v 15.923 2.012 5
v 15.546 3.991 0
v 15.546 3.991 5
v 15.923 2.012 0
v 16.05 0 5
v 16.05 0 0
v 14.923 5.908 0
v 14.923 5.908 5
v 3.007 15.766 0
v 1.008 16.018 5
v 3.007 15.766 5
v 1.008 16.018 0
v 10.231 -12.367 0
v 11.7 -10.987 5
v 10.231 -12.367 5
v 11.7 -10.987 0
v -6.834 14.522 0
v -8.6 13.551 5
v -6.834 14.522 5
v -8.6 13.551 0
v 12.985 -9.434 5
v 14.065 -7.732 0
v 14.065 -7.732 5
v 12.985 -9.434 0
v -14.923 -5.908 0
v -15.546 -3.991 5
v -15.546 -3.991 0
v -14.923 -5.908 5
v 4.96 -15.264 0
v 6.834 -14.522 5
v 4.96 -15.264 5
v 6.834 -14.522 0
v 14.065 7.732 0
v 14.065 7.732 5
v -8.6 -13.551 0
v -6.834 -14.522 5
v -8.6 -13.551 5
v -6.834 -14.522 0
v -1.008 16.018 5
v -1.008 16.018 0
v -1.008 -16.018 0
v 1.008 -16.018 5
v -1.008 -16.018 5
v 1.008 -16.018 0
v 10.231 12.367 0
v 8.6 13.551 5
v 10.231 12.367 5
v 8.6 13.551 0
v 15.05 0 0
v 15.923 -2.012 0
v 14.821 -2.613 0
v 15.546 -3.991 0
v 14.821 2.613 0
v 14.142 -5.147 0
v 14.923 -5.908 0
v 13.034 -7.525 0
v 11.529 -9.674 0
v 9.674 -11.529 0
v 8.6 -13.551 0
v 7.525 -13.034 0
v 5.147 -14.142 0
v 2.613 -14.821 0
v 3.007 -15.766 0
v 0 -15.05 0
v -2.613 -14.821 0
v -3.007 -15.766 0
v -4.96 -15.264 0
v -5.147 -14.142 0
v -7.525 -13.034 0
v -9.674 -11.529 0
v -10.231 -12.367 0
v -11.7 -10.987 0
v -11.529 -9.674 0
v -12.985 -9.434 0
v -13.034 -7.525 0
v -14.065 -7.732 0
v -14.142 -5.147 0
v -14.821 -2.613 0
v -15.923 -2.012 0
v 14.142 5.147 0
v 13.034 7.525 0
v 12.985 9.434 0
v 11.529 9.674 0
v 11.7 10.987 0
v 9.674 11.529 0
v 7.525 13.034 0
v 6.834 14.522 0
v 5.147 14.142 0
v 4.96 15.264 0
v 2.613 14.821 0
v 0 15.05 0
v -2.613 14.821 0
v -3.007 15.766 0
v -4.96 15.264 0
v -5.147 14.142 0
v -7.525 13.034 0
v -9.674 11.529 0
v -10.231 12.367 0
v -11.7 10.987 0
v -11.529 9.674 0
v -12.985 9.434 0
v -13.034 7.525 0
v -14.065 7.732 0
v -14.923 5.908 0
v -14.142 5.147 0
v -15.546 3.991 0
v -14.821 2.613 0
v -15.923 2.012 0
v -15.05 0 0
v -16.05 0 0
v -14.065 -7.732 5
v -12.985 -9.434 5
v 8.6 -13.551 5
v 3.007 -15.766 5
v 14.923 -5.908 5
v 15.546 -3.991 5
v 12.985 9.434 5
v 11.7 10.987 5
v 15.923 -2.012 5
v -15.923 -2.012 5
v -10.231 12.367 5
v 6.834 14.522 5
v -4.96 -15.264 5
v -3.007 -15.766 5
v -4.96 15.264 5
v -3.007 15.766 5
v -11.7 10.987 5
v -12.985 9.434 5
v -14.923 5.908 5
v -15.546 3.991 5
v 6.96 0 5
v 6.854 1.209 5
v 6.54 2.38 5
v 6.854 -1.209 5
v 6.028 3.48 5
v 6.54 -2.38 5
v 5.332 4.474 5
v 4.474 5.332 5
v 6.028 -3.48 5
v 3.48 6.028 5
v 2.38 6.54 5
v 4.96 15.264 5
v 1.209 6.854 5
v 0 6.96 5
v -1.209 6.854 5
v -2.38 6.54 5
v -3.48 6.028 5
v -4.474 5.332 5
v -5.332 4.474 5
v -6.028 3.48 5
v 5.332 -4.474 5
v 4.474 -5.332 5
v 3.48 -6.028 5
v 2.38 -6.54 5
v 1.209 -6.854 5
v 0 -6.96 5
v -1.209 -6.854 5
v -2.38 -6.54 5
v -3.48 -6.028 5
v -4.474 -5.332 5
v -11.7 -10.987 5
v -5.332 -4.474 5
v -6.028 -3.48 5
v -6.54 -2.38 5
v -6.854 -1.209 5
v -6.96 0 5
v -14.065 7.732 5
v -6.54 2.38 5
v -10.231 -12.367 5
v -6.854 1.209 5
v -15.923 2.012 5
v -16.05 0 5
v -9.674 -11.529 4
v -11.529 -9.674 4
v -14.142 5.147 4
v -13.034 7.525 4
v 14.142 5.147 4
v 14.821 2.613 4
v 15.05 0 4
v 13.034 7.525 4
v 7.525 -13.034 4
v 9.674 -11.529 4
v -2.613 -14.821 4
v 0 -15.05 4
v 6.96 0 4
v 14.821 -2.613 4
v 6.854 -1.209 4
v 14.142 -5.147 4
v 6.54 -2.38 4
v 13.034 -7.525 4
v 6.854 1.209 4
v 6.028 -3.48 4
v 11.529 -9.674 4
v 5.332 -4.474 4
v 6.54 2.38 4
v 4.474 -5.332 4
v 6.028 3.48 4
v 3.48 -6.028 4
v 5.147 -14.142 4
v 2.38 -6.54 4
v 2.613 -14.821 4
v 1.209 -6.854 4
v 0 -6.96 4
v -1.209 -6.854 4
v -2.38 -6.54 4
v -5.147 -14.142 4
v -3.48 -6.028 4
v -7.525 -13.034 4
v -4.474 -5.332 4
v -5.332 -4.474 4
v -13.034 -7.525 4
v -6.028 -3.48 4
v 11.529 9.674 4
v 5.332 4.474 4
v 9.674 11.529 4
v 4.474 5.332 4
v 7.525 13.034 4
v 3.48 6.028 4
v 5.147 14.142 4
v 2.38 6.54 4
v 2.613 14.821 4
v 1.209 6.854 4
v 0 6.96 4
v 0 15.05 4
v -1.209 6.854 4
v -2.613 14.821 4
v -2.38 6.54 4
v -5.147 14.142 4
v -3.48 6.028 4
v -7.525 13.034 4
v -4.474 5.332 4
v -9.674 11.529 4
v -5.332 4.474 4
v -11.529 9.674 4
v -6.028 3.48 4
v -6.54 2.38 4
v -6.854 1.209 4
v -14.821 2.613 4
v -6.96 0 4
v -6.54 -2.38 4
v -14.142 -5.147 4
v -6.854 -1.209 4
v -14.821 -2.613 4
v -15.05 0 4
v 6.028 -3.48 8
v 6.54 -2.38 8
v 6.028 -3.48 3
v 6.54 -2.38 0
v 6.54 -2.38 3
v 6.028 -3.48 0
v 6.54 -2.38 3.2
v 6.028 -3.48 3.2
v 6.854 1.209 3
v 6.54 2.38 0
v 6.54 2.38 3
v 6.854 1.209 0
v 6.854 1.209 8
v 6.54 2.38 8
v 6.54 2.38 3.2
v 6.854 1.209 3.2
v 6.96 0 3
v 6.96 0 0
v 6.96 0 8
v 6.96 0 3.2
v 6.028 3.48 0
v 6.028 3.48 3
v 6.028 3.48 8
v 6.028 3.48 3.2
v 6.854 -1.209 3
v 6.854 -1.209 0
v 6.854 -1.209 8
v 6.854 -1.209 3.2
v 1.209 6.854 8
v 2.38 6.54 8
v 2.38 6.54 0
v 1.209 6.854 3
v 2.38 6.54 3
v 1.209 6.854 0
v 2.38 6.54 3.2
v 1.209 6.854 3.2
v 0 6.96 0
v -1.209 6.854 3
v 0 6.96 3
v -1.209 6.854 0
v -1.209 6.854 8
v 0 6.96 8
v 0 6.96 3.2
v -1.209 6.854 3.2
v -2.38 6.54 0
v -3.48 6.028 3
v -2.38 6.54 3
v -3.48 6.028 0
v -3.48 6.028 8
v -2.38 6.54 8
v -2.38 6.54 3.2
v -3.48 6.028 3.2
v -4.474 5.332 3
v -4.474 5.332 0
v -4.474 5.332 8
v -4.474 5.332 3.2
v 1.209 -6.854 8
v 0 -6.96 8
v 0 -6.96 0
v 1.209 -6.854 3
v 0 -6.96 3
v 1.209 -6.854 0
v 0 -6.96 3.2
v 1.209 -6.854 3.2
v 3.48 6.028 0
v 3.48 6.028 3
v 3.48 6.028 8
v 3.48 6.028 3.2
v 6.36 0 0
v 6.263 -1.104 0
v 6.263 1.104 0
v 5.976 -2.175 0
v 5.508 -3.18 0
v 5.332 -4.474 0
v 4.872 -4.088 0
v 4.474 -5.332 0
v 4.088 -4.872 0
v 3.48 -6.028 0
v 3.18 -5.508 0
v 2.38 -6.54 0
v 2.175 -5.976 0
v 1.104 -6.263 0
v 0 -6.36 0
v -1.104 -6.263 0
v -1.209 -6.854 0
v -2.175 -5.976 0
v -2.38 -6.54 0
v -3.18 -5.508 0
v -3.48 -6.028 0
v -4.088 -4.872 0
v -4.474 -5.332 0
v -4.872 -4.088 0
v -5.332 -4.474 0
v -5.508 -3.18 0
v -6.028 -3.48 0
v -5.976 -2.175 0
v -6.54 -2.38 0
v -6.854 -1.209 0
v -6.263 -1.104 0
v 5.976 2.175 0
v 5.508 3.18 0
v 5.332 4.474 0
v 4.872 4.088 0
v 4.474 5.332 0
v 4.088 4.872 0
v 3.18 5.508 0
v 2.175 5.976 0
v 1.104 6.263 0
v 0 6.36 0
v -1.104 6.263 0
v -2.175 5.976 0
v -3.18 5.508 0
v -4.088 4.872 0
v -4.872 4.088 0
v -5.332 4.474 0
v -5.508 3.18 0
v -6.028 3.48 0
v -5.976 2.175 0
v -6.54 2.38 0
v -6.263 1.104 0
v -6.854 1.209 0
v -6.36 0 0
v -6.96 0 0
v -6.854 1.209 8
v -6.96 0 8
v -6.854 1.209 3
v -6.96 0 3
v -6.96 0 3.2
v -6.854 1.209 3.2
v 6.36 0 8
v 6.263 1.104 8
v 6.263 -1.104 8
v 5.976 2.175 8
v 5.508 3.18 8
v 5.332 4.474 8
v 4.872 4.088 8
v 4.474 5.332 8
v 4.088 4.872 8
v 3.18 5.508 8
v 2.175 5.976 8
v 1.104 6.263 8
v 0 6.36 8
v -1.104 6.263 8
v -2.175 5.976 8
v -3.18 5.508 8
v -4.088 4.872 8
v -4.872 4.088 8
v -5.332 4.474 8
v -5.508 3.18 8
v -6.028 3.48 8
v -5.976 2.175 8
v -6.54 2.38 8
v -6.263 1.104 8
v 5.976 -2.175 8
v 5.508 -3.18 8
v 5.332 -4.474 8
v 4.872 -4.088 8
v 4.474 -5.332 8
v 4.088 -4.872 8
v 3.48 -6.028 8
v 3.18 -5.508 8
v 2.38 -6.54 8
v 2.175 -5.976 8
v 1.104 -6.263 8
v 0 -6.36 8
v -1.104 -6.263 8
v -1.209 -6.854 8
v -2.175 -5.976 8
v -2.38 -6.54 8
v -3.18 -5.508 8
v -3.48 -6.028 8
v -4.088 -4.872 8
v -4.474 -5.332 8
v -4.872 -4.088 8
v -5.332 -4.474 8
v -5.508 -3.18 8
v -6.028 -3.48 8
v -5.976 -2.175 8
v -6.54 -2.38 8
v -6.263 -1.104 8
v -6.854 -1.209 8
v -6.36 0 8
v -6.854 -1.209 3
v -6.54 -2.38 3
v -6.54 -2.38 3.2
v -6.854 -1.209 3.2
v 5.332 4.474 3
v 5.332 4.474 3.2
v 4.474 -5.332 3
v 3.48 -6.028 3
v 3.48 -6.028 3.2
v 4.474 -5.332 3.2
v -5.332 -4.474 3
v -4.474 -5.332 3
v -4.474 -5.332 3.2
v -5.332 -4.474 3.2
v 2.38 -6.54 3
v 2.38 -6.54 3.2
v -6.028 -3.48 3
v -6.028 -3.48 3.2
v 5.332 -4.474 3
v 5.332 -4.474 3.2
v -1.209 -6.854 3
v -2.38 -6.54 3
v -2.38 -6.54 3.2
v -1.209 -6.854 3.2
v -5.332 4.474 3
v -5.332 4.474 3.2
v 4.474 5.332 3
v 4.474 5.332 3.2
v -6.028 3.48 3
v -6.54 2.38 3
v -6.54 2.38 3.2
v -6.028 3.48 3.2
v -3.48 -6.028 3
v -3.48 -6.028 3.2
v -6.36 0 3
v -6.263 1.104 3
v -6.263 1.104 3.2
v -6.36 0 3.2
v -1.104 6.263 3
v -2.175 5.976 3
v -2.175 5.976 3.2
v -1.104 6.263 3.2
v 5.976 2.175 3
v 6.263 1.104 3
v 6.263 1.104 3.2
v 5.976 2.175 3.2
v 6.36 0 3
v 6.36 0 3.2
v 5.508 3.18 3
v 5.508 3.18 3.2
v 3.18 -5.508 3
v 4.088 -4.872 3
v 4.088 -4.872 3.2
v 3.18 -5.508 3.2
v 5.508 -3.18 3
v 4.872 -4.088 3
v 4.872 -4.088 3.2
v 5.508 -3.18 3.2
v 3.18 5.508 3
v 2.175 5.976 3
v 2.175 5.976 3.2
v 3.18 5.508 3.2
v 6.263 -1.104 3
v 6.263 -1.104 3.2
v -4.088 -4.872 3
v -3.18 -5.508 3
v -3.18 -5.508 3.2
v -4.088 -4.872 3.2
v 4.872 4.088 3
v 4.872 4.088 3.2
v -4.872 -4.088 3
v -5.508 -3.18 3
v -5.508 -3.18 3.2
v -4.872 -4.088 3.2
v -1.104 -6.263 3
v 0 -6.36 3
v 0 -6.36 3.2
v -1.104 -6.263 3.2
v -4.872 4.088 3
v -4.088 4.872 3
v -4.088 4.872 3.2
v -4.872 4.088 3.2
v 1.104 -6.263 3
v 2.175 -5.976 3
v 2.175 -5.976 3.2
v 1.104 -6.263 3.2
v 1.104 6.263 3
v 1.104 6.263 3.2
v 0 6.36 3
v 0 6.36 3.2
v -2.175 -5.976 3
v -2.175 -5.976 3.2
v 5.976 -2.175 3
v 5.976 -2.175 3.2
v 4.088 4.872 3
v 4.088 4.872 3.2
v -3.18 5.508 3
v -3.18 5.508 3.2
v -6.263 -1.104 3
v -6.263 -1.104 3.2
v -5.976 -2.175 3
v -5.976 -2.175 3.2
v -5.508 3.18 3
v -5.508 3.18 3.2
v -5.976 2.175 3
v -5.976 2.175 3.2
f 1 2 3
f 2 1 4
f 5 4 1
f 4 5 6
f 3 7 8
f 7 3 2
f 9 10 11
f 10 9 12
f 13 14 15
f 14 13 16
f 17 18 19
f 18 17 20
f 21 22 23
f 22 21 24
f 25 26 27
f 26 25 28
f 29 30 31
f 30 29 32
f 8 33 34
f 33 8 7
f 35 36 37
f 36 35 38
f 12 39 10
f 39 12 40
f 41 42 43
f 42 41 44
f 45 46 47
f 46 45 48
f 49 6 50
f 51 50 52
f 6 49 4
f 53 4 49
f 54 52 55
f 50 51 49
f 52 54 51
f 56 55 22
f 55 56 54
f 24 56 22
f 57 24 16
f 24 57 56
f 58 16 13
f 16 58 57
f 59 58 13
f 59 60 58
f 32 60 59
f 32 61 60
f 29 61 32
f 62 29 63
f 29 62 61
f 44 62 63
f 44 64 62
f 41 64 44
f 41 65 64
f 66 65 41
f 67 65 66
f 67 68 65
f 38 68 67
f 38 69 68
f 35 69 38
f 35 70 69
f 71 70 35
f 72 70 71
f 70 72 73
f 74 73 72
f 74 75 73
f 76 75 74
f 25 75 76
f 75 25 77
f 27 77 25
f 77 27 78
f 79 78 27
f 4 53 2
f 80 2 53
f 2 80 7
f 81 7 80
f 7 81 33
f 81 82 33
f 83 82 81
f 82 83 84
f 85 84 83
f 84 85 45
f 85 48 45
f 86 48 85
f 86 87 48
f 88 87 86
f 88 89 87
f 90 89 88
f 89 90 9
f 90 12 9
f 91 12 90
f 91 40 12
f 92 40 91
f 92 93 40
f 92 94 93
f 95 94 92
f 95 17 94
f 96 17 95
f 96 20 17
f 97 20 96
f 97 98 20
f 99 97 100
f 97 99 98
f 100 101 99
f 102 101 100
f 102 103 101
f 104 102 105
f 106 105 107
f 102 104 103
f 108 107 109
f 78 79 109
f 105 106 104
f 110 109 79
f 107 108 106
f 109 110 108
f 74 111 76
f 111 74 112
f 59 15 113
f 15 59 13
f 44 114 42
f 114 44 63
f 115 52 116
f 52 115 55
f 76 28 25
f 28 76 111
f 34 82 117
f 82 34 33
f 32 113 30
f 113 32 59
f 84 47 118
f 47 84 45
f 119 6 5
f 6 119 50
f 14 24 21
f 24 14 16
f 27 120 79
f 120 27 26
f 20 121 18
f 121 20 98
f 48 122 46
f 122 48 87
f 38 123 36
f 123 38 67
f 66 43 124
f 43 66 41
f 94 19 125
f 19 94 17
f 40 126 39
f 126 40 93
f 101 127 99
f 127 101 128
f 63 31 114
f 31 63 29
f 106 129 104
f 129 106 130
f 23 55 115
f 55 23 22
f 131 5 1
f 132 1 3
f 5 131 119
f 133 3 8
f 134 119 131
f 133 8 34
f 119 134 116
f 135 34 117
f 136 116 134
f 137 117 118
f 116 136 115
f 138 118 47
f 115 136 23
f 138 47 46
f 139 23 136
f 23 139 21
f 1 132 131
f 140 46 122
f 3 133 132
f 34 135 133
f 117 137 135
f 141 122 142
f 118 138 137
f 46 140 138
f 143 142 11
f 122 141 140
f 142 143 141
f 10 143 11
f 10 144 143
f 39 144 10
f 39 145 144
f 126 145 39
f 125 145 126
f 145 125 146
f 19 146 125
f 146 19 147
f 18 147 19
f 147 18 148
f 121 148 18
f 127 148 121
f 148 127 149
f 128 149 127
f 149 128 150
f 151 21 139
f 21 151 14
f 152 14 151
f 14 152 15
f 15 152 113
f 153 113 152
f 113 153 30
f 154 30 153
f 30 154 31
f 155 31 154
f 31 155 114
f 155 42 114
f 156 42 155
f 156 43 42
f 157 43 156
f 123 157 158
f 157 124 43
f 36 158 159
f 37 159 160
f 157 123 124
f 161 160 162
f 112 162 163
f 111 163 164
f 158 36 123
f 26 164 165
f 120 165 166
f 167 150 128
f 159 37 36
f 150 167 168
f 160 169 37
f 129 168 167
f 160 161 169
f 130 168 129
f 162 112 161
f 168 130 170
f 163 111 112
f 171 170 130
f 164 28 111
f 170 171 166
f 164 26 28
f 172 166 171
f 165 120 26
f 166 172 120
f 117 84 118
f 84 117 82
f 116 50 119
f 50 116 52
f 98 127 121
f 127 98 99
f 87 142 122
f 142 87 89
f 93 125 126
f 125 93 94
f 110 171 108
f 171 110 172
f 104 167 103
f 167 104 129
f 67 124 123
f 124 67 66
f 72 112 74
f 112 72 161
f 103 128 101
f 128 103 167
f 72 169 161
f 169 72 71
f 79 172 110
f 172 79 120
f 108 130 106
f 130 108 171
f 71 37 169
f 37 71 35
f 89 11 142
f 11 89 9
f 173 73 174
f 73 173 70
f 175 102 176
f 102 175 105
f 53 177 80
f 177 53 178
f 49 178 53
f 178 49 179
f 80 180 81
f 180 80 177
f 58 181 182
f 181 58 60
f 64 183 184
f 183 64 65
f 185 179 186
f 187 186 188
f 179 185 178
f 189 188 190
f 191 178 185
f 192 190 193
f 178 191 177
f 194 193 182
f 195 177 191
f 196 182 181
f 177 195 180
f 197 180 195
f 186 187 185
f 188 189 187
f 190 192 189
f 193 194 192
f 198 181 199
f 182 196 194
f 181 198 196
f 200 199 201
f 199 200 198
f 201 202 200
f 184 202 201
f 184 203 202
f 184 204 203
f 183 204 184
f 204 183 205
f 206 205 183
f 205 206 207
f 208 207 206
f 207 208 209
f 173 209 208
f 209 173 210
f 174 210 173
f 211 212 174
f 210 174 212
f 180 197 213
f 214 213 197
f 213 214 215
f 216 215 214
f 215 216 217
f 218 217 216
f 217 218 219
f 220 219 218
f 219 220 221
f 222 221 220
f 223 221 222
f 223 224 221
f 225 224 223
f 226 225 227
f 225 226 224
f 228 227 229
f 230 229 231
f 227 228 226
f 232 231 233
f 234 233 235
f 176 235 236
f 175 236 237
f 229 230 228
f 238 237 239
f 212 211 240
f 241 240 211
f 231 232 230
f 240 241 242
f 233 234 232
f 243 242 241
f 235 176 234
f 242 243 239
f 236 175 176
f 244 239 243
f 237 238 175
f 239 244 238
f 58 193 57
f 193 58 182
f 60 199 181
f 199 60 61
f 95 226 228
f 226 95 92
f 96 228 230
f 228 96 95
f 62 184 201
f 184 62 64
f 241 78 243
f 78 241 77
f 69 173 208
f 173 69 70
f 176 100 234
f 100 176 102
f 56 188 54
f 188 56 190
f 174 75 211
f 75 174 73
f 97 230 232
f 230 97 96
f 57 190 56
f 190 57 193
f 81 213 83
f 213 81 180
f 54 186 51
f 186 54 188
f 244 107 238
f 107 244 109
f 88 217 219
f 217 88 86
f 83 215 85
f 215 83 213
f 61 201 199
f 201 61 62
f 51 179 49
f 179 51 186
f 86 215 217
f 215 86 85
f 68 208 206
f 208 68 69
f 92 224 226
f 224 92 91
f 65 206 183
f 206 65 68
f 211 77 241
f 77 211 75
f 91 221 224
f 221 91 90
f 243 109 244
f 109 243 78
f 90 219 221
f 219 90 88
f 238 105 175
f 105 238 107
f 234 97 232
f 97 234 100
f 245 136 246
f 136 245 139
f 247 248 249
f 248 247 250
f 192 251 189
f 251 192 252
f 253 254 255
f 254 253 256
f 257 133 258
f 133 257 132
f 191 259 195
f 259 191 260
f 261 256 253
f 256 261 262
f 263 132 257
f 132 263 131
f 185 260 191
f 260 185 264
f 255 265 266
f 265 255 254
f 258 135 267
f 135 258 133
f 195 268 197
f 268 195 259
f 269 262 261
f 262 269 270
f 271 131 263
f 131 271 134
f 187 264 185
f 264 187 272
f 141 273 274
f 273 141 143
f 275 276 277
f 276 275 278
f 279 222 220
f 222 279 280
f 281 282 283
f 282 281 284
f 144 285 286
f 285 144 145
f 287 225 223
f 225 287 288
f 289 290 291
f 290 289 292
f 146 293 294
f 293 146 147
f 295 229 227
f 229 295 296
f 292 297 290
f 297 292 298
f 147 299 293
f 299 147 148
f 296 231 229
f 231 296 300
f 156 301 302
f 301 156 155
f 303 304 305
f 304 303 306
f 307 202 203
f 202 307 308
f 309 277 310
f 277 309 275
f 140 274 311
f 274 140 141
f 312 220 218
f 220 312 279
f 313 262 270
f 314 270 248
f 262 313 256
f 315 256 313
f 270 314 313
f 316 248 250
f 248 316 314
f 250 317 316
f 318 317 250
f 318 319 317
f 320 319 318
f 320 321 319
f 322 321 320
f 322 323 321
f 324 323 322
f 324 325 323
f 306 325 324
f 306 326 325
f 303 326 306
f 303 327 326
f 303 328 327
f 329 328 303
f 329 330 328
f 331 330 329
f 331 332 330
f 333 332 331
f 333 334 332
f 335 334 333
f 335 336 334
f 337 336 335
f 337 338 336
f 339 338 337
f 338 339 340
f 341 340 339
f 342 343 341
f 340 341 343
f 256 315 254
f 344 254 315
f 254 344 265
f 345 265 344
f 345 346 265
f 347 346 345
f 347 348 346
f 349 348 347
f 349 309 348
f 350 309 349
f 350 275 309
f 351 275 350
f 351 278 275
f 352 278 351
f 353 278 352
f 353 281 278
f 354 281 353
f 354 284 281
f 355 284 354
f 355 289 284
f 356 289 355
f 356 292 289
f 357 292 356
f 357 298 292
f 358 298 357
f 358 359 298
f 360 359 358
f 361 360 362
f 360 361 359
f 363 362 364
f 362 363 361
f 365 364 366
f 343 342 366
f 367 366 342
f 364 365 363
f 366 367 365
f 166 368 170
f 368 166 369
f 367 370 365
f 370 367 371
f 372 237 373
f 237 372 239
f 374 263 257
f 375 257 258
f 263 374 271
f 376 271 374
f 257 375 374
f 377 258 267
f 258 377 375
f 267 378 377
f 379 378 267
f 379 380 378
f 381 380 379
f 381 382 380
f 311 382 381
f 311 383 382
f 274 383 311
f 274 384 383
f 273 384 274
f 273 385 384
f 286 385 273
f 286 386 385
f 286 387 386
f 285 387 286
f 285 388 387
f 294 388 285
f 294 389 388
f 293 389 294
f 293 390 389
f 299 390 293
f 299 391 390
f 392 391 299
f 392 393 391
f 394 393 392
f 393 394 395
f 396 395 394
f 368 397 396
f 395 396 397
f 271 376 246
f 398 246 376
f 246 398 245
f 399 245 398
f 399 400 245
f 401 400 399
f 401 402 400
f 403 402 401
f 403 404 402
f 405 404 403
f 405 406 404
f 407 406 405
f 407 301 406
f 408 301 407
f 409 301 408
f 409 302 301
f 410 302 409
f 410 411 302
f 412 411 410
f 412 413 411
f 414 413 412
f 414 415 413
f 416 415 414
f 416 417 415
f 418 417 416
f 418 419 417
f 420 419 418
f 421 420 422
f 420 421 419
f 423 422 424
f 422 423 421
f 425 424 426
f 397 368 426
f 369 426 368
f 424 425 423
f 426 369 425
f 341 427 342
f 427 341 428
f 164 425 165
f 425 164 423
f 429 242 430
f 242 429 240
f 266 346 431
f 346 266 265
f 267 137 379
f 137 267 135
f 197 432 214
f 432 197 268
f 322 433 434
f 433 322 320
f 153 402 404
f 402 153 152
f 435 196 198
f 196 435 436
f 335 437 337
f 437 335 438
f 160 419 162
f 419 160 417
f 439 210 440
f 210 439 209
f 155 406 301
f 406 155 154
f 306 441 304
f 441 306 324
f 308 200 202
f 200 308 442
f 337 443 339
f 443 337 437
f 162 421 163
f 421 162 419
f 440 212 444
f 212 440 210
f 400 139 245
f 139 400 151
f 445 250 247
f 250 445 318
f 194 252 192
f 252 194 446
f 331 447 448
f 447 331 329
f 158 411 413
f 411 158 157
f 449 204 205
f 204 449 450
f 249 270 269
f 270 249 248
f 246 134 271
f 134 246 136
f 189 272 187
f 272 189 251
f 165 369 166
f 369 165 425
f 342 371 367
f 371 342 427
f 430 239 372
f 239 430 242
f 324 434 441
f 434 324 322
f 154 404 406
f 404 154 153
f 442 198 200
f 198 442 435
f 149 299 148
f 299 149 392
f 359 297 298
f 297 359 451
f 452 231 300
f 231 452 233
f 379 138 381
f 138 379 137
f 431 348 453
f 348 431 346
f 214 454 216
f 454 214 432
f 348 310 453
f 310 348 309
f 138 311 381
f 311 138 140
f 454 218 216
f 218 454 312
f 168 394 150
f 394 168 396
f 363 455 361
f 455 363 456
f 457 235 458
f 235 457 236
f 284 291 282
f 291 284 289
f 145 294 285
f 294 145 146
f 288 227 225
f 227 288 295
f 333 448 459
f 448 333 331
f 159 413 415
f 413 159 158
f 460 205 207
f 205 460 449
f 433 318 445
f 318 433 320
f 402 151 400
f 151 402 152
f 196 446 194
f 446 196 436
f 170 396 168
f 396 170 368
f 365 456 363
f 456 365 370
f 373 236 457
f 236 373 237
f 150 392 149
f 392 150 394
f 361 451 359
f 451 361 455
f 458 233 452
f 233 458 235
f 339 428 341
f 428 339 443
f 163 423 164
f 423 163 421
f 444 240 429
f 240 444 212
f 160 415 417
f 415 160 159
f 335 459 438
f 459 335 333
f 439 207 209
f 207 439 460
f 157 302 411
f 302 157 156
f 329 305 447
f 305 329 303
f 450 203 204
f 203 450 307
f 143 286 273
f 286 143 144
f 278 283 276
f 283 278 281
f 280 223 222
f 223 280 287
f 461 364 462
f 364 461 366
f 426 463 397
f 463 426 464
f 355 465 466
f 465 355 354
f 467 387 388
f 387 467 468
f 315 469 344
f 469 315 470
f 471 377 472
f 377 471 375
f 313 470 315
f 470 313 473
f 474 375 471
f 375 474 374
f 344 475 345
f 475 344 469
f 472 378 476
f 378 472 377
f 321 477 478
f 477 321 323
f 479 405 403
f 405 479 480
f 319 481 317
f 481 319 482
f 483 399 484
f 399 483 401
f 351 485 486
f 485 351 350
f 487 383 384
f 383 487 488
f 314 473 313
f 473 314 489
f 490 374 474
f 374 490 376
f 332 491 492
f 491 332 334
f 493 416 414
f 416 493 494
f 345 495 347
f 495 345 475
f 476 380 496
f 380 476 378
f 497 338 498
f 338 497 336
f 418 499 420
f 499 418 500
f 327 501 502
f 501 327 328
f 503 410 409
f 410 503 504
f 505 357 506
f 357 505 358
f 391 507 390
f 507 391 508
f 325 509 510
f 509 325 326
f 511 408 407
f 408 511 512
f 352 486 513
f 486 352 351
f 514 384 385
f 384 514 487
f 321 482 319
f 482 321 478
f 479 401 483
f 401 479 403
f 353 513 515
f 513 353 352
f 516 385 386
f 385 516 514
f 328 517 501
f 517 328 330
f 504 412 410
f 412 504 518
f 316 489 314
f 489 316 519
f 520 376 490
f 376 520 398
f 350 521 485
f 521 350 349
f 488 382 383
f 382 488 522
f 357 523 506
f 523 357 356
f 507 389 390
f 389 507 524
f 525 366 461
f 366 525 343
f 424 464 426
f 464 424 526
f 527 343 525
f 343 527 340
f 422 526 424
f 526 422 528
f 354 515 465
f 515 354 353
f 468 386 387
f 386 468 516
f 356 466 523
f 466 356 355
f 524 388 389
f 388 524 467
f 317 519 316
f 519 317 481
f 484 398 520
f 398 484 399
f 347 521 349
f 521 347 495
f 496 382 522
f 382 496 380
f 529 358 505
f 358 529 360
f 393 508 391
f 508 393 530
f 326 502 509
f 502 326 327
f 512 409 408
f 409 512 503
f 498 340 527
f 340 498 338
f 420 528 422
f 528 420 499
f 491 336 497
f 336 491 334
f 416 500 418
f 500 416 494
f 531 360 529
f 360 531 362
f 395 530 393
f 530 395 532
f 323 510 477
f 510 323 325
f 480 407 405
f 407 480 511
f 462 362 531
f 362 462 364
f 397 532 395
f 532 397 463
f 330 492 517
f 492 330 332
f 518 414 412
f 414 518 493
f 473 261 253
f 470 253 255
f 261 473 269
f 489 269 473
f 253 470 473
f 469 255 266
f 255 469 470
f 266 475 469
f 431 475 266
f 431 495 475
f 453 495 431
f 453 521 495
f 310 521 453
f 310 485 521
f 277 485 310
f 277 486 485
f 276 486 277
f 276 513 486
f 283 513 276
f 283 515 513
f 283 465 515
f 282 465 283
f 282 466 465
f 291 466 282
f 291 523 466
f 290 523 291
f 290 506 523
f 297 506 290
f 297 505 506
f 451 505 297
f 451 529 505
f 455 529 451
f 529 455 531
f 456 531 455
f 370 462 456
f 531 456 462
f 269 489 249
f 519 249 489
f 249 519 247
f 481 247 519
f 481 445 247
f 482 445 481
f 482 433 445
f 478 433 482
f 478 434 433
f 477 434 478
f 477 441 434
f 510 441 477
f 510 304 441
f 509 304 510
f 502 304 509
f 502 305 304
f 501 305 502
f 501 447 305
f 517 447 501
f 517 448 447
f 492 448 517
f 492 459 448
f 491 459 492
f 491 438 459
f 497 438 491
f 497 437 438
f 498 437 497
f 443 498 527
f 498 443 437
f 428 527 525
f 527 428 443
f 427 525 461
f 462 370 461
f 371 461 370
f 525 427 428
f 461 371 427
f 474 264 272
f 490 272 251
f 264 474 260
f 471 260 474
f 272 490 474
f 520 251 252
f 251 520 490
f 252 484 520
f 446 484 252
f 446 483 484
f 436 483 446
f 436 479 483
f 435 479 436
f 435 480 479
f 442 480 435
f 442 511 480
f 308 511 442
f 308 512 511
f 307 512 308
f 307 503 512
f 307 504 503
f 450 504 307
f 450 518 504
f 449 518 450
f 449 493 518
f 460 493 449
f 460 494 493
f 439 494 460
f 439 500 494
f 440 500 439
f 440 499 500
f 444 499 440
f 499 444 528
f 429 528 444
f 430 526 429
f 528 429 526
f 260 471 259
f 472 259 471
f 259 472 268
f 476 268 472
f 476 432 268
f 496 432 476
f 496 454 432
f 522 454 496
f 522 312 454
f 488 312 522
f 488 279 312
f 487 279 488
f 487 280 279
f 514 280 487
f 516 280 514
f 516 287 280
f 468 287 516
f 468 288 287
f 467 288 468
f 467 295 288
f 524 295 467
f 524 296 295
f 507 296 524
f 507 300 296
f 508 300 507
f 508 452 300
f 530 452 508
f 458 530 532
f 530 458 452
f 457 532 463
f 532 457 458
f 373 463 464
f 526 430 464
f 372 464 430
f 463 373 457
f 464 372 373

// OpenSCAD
// Customizable Egg Holder

/* [parameter] */

//The diameter of the bottom of the egg.
egg_holder_outer_diameter=13.92;

egg_holder_wall_thickness=1.2;

egg_holder_height=3;

//The diameter of the Compact LED Light for CR2032.
base_inner_diameter=30.1;

base_wall_thickness=2;

base_height=5;


/* [Hidden] */


difference() {
    union() {
        //base
        difference() {
            cylinder(h=base_height, d=(base_inner_diameter+base_wall_thickness), $fn=50);
            translate([0,0,-0.05]) 
                cylinder(h=(base_height-0.95), d=base_inner_diameter,$fn=36);
        }
        
        //egg holder
        cylinder(h=(egg_holder_height+base_height), d=egg_holder_outer_diameter, $fn=36);
    }
    
    //egg holder hole
    translate([0,0,-0.05])
        cylinder(h=(egg_holder_height+base_height+0.1), d=(egg_holder_outer_diameter-egg_holder_wall_thickness), $fn=36);
    
    //support break
    translate([0,0,(base_height-2)])
        cylinder(h=0.2, d=(egg_holder_outer_diameter+2), $fn=36);
}
